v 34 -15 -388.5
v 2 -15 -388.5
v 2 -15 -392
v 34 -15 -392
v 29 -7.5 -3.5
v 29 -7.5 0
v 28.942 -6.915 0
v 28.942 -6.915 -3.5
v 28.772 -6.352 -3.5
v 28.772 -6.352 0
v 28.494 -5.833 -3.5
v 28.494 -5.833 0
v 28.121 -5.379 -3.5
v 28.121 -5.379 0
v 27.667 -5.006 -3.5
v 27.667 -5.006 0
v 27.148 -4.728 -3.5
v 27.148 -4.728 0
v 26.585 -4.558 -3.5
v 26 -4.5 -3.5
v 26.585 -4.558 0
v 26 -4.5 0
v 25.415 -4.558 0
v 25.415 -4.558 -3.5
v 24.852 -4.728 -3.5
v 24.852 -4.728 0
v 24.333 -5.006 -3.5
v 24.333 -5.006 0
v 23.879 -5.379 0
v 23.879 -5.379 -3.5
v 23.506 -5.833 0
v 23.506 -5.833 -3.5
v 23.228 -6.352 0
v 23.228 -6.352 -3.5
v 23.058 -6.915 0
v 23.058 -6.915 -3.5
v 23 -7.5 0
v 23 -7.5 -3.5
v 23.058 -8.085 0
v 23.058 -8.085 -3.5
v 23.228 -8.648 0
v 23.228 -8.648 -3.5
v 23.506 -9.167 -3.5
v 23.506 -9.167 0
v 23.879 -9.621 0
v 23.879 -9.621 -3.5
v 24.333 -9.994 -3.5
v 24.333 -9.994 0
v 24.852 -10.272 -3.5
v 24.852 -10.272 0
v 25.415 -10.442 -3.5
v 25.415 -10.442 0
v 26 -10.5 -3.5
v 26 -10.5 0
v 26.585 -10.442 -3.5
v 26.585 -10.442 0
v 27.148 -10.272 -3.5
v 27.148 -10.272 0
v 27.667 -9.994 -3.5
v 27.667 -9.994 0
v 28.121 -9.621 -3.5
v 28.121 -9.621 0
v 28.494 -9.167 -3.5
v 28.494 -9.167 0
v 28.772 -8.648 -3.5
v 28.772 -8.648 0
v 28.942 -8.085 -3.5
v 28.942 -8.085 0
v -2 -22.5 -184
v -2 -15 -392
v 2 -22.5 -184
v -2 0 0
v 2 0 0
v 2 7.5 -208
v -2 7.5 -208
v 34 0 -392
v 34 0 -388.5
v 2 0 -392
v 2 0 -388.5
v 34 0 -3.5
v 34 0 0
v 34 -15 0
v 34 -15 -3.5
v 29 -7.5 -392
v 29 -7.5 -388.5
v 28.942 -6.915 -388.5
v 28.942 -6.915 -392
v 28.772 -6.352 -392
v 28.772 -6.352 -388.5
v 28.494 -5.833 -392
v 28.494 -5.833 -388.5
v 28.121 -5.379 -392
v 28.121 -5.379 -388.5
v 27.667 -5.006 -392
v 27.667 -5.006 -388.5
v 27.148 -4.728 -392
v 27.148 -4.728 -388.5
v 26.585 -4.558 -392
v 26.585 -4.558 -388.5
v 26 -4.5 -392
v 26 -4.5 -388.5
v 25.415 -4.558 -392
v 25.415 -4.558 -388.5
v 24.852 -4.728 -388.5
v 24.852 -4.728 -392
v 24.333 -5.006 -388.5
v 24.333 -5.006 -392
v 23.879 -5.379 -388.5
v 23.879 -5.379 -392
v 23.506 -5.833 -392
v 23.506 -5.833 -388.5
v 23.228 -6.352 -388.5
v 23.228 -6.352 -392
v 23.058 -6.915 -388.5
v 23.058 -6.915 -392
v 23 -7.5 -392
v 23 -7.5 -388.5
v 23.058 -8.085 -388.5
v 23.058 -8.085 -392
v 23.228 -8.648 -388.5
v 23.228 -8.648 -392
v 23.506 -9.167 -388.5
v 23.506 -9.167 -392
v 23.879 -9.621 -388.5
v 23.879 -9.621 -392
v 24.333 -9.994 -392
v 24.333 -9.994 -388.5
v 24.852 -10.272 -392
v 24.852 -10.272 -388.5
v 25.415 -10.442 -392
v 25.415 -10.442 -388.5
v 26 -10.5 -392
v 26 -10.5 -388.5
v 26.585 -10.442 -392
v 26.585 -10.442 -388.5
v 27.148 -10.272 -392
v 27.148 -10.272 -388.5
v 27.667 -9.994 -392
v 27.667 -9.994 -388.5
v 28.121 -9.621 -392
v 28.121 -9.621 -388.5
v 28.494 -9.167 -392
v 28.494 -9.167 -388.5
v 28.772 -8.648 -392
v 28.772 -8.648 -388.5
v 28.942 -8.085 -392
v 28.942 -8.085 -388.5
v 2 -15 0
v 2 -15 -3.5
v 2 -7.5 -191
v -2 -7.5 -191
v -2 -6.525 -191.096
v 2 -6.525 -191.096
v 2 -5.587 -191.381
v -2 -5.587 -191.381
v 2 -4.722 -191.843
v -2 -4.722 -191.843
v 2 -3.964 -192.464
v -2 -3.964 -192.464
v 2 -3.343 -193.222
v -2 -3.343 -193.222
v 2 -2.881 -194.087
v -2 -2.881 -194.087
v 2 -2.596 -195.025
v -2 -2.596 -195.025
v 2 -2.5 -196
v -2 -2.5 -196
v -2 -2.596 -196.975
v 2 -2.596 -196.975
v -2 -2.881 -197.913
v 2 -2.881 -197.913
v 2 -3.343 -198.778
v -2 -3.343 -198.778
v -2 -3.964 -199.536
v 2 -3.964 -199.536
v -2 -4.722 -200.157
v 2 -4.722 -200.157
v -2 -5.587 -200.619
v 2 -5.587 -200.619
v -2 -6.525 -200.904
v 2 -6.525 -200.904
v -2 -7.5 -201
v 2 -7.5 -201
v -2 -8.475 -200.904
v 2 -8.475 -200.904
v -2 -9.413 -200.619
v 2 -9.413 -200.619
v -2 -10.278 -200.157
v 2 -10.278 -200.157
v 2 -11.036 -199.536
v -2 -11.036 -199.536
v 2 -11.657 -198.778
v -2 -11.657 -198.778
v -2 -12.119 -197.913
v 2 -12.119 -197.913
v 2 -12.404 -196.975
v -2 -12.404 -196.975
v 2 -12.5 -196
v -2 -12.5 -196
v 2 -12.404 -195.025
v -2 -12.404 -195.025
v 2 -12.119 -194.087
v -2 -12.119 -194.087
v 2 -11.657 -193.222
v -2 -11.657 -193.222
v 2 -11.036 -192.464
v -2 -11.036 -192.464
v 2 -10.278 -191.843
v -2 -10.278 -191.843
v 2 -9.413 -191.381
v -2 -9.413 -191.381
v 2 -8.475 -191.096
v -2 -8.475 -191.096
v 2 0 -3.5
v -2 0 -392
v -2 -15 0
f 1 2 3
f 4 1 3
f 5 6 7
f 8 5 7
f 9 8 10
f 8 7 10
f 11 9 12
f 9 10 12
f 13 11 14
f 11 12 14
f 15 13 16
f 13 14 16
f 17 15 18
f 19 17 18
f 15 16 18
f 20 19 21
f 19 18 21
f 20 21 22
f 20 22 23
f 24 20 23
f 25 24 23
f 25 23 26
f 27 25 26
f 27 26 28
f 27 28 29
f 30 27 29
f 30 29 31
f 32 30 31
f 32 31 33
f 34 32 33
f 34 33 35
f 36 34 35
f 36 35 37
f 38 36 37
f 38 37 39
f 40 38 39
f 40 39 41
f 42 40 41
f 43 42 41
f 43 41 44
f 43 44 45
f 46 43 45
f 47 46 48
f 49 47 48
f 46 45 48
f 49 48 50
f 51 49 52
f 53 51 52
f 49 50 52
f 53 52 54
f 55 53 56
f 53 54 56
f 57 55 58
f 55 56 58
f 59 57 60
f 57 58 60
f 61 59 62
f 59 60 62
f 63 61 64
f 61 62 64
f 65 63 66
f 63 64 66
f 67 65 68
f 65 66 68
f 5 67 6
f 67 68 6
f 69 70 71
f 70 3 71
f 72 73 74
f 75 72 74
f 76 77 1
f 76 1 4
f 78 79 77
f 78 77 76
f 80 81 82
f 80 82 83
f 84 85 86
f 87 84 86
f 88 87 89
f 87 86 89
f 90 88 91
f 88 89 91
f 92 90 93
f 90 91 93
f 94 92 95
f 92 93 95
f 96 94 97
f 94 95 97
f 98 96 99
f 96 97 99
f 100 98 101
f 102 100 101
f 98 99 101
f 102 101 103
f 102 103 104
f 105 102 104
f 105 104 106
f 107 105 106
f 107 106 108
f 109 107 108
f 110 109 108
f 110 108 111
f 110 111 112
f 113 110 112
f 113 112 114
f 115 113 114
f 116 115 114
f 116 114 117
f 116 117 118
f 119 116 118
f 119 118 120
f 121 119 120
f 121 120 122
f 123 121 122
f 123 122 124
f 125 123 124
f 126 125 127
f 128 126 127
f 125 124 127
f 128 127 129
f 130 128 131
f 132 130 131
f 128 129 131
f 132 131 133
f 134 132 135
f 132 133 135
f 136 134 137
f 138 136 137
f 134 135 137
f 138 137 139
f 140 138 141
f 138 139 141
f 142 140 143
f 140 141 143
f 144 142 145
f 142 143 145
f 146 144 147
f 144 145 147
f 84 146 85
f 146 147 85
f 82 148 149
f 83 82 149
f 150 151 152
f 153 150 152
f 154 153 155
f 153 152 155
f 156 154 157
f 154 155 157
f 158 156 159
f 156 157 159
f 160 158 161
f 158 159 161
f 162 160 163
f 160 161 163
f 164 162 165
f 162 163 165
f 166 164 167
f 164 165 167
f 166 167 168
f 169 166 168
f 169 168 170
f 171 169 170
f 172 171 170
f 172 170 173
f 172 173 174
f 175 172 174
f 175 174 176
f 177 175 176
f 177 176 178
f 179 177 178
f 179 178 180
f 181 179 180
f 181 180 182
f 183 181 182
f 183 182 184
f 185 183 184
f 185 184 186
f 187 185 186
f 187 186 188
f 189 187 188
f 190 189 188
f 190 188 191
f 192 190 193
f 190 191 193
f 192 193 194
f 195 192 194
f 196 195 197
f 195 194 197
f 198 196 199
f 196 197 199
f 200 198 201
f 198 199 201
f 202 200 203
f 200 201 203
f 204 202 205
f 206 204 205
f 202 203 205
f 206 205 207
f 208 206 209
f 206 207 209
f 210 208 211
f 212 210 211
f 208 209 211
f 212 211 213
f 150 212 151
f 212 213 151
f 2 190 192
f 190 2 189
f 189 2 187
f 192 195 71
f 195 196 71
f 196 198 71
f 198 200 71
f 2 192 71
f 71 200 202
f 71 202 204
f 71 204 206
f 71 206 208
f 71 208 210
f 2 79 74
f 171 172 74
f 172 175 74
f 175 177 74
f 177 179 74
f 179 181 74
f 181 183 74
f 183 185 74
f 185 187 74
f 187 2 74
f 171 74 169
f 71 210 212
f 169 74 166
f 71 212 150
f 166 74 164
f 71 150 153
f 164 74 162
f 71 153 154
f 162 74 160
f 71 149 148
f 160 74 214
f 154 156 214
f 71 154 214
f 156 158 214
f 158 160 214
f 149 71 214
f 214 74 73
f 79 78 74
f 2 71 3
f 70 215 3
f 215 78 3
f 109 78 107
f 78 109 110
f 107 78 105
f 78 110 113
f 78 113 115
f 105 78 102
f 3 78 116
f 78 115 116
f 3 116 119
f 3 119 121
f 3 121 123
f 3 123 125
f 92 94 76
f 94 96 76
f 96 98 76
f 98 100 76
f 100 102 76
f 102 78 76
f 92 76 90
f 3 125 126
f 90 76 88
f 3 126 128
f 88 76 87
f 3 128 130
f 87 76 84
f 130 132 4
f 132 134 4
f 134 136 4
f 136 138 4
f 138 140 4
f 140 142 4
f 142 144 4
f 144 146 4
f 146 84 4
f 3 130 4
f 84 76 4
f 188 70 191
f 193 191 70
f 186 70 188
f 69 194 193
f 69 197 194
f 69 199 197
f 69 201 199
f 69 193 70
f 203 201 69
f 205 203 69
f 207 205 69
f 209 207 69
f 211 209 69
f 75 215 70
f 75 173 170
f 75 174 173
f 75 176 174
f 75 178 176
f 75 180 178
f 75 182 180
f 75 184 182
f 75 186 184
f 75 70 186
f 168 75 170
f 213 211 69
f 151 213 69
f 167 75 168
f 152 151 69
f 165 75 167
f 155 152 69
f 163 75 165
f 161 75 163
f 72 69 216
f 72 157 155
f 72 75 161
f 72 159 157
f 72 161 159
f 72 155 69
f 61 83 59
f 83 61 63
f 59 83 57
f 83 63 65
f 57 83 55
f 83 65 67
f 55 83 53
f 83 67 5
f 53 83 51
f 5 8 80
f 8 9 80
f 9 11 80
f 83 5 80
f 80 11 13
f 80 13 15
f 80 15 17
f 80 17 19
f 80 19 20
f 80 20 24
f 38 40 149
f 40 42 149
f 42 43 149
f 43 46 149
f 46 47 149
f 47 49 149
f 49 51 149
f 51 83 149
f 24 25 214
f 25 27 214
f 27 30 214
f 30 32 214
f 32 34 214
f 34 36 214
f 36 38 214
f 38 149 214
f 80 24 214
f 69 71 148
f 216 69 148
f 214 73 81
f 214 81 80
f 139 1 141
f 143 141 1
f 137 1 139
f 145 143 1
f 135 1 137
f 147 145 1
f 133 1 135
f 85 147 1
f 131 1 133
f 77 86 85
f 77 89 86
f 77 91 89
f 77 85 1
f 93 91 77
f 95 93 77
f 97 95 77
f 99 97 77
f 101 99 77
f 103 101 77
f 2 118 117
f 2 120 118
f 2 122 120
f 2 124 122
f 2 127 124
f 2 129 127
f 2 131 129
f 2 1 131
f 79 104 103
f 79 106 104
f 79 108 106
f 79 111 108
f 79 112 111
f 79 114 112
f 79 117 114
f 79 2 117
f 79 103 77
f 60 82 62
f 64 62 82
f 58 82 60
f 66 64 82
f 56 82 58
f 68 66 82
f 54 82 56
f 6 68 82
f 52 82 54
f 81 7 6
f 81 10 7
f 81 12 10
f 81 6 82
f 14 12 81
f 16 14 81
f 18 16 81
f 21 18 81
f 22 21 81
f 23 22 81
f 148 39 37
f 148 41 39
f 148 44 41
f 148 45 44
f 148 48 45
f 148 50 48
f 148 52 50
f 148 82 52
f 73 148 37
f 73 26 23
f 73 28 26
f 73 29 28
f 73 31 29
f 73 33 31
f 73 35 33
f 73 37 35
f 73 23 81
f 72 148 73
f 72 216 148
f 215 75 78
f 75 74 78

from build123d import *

# Parameters (mm, degrees)
BOSS_EXTRUDE2_DEPTH = 2
SKETCH4_W           = 3.5
SKETCH4_H           = 15
BOSS_EXTRUDE3_DEPTH = 32
SKETCH5_R           = 3
CUT_EXTRUDE1_DEPTH  = 392
SKETCH7_R           = 5
CUT_EXTRUDE2_DEPTH  = 5


with BuildPart() as part:
    # Sketch2 → Boss-Extrude2 (new, symmetric)
    with BuildSketch(Plane(origin=(0, 0, 0), x_dir=(0, 0, -1), z_dir=(1, 0, 0))):
        Polygon((0, 0), (208, 7.5), (392, 0), (392, -15), (184, -22.5), (0, -15), align=None)
    extrude(amount=BOSS_EXTRUDE2_DEPTH, both=True)

    # Sketch4 → Boss-Extrude3 (add)
    with BuildSketch(Plane(origin=(2, 0, 0), x_dir=(0, 0, -1), z_dir=(1, 0, 0))):
        with Locations((1.75, -7.5)):
            Rectangle(SKETCH4_W, SKETCH4_H)
        with Locations((390.25, -7.5)):
            Rectangle(SKETCH4_W, SKETCH4_H)
    extrude(amount=BOSS_EXTRUDE3_DEPTH)

    # Sketch5 → Cut-Extrude1 (cut)
    with BuildSketch(Plane.XY):
        with Locations((26, -7.5)):
            Circle(SKETCH5_R)
    extrude(amount=-CUT_EXTRUDE1_DEPTH, mode=Mode.SUBTRACT)

    # Sketch7 → Cut-Extrude2 (cut)
    with BuildSketch(Plane.ZY.offset(2)):
        with Locations((-196, -7.5)):
            Circle(SKETCH7_R)
    extrude(amount=-CUT_EXTRUDE2_DEPTH, mode=Mode.SUBTRACT)


solid = part.part
